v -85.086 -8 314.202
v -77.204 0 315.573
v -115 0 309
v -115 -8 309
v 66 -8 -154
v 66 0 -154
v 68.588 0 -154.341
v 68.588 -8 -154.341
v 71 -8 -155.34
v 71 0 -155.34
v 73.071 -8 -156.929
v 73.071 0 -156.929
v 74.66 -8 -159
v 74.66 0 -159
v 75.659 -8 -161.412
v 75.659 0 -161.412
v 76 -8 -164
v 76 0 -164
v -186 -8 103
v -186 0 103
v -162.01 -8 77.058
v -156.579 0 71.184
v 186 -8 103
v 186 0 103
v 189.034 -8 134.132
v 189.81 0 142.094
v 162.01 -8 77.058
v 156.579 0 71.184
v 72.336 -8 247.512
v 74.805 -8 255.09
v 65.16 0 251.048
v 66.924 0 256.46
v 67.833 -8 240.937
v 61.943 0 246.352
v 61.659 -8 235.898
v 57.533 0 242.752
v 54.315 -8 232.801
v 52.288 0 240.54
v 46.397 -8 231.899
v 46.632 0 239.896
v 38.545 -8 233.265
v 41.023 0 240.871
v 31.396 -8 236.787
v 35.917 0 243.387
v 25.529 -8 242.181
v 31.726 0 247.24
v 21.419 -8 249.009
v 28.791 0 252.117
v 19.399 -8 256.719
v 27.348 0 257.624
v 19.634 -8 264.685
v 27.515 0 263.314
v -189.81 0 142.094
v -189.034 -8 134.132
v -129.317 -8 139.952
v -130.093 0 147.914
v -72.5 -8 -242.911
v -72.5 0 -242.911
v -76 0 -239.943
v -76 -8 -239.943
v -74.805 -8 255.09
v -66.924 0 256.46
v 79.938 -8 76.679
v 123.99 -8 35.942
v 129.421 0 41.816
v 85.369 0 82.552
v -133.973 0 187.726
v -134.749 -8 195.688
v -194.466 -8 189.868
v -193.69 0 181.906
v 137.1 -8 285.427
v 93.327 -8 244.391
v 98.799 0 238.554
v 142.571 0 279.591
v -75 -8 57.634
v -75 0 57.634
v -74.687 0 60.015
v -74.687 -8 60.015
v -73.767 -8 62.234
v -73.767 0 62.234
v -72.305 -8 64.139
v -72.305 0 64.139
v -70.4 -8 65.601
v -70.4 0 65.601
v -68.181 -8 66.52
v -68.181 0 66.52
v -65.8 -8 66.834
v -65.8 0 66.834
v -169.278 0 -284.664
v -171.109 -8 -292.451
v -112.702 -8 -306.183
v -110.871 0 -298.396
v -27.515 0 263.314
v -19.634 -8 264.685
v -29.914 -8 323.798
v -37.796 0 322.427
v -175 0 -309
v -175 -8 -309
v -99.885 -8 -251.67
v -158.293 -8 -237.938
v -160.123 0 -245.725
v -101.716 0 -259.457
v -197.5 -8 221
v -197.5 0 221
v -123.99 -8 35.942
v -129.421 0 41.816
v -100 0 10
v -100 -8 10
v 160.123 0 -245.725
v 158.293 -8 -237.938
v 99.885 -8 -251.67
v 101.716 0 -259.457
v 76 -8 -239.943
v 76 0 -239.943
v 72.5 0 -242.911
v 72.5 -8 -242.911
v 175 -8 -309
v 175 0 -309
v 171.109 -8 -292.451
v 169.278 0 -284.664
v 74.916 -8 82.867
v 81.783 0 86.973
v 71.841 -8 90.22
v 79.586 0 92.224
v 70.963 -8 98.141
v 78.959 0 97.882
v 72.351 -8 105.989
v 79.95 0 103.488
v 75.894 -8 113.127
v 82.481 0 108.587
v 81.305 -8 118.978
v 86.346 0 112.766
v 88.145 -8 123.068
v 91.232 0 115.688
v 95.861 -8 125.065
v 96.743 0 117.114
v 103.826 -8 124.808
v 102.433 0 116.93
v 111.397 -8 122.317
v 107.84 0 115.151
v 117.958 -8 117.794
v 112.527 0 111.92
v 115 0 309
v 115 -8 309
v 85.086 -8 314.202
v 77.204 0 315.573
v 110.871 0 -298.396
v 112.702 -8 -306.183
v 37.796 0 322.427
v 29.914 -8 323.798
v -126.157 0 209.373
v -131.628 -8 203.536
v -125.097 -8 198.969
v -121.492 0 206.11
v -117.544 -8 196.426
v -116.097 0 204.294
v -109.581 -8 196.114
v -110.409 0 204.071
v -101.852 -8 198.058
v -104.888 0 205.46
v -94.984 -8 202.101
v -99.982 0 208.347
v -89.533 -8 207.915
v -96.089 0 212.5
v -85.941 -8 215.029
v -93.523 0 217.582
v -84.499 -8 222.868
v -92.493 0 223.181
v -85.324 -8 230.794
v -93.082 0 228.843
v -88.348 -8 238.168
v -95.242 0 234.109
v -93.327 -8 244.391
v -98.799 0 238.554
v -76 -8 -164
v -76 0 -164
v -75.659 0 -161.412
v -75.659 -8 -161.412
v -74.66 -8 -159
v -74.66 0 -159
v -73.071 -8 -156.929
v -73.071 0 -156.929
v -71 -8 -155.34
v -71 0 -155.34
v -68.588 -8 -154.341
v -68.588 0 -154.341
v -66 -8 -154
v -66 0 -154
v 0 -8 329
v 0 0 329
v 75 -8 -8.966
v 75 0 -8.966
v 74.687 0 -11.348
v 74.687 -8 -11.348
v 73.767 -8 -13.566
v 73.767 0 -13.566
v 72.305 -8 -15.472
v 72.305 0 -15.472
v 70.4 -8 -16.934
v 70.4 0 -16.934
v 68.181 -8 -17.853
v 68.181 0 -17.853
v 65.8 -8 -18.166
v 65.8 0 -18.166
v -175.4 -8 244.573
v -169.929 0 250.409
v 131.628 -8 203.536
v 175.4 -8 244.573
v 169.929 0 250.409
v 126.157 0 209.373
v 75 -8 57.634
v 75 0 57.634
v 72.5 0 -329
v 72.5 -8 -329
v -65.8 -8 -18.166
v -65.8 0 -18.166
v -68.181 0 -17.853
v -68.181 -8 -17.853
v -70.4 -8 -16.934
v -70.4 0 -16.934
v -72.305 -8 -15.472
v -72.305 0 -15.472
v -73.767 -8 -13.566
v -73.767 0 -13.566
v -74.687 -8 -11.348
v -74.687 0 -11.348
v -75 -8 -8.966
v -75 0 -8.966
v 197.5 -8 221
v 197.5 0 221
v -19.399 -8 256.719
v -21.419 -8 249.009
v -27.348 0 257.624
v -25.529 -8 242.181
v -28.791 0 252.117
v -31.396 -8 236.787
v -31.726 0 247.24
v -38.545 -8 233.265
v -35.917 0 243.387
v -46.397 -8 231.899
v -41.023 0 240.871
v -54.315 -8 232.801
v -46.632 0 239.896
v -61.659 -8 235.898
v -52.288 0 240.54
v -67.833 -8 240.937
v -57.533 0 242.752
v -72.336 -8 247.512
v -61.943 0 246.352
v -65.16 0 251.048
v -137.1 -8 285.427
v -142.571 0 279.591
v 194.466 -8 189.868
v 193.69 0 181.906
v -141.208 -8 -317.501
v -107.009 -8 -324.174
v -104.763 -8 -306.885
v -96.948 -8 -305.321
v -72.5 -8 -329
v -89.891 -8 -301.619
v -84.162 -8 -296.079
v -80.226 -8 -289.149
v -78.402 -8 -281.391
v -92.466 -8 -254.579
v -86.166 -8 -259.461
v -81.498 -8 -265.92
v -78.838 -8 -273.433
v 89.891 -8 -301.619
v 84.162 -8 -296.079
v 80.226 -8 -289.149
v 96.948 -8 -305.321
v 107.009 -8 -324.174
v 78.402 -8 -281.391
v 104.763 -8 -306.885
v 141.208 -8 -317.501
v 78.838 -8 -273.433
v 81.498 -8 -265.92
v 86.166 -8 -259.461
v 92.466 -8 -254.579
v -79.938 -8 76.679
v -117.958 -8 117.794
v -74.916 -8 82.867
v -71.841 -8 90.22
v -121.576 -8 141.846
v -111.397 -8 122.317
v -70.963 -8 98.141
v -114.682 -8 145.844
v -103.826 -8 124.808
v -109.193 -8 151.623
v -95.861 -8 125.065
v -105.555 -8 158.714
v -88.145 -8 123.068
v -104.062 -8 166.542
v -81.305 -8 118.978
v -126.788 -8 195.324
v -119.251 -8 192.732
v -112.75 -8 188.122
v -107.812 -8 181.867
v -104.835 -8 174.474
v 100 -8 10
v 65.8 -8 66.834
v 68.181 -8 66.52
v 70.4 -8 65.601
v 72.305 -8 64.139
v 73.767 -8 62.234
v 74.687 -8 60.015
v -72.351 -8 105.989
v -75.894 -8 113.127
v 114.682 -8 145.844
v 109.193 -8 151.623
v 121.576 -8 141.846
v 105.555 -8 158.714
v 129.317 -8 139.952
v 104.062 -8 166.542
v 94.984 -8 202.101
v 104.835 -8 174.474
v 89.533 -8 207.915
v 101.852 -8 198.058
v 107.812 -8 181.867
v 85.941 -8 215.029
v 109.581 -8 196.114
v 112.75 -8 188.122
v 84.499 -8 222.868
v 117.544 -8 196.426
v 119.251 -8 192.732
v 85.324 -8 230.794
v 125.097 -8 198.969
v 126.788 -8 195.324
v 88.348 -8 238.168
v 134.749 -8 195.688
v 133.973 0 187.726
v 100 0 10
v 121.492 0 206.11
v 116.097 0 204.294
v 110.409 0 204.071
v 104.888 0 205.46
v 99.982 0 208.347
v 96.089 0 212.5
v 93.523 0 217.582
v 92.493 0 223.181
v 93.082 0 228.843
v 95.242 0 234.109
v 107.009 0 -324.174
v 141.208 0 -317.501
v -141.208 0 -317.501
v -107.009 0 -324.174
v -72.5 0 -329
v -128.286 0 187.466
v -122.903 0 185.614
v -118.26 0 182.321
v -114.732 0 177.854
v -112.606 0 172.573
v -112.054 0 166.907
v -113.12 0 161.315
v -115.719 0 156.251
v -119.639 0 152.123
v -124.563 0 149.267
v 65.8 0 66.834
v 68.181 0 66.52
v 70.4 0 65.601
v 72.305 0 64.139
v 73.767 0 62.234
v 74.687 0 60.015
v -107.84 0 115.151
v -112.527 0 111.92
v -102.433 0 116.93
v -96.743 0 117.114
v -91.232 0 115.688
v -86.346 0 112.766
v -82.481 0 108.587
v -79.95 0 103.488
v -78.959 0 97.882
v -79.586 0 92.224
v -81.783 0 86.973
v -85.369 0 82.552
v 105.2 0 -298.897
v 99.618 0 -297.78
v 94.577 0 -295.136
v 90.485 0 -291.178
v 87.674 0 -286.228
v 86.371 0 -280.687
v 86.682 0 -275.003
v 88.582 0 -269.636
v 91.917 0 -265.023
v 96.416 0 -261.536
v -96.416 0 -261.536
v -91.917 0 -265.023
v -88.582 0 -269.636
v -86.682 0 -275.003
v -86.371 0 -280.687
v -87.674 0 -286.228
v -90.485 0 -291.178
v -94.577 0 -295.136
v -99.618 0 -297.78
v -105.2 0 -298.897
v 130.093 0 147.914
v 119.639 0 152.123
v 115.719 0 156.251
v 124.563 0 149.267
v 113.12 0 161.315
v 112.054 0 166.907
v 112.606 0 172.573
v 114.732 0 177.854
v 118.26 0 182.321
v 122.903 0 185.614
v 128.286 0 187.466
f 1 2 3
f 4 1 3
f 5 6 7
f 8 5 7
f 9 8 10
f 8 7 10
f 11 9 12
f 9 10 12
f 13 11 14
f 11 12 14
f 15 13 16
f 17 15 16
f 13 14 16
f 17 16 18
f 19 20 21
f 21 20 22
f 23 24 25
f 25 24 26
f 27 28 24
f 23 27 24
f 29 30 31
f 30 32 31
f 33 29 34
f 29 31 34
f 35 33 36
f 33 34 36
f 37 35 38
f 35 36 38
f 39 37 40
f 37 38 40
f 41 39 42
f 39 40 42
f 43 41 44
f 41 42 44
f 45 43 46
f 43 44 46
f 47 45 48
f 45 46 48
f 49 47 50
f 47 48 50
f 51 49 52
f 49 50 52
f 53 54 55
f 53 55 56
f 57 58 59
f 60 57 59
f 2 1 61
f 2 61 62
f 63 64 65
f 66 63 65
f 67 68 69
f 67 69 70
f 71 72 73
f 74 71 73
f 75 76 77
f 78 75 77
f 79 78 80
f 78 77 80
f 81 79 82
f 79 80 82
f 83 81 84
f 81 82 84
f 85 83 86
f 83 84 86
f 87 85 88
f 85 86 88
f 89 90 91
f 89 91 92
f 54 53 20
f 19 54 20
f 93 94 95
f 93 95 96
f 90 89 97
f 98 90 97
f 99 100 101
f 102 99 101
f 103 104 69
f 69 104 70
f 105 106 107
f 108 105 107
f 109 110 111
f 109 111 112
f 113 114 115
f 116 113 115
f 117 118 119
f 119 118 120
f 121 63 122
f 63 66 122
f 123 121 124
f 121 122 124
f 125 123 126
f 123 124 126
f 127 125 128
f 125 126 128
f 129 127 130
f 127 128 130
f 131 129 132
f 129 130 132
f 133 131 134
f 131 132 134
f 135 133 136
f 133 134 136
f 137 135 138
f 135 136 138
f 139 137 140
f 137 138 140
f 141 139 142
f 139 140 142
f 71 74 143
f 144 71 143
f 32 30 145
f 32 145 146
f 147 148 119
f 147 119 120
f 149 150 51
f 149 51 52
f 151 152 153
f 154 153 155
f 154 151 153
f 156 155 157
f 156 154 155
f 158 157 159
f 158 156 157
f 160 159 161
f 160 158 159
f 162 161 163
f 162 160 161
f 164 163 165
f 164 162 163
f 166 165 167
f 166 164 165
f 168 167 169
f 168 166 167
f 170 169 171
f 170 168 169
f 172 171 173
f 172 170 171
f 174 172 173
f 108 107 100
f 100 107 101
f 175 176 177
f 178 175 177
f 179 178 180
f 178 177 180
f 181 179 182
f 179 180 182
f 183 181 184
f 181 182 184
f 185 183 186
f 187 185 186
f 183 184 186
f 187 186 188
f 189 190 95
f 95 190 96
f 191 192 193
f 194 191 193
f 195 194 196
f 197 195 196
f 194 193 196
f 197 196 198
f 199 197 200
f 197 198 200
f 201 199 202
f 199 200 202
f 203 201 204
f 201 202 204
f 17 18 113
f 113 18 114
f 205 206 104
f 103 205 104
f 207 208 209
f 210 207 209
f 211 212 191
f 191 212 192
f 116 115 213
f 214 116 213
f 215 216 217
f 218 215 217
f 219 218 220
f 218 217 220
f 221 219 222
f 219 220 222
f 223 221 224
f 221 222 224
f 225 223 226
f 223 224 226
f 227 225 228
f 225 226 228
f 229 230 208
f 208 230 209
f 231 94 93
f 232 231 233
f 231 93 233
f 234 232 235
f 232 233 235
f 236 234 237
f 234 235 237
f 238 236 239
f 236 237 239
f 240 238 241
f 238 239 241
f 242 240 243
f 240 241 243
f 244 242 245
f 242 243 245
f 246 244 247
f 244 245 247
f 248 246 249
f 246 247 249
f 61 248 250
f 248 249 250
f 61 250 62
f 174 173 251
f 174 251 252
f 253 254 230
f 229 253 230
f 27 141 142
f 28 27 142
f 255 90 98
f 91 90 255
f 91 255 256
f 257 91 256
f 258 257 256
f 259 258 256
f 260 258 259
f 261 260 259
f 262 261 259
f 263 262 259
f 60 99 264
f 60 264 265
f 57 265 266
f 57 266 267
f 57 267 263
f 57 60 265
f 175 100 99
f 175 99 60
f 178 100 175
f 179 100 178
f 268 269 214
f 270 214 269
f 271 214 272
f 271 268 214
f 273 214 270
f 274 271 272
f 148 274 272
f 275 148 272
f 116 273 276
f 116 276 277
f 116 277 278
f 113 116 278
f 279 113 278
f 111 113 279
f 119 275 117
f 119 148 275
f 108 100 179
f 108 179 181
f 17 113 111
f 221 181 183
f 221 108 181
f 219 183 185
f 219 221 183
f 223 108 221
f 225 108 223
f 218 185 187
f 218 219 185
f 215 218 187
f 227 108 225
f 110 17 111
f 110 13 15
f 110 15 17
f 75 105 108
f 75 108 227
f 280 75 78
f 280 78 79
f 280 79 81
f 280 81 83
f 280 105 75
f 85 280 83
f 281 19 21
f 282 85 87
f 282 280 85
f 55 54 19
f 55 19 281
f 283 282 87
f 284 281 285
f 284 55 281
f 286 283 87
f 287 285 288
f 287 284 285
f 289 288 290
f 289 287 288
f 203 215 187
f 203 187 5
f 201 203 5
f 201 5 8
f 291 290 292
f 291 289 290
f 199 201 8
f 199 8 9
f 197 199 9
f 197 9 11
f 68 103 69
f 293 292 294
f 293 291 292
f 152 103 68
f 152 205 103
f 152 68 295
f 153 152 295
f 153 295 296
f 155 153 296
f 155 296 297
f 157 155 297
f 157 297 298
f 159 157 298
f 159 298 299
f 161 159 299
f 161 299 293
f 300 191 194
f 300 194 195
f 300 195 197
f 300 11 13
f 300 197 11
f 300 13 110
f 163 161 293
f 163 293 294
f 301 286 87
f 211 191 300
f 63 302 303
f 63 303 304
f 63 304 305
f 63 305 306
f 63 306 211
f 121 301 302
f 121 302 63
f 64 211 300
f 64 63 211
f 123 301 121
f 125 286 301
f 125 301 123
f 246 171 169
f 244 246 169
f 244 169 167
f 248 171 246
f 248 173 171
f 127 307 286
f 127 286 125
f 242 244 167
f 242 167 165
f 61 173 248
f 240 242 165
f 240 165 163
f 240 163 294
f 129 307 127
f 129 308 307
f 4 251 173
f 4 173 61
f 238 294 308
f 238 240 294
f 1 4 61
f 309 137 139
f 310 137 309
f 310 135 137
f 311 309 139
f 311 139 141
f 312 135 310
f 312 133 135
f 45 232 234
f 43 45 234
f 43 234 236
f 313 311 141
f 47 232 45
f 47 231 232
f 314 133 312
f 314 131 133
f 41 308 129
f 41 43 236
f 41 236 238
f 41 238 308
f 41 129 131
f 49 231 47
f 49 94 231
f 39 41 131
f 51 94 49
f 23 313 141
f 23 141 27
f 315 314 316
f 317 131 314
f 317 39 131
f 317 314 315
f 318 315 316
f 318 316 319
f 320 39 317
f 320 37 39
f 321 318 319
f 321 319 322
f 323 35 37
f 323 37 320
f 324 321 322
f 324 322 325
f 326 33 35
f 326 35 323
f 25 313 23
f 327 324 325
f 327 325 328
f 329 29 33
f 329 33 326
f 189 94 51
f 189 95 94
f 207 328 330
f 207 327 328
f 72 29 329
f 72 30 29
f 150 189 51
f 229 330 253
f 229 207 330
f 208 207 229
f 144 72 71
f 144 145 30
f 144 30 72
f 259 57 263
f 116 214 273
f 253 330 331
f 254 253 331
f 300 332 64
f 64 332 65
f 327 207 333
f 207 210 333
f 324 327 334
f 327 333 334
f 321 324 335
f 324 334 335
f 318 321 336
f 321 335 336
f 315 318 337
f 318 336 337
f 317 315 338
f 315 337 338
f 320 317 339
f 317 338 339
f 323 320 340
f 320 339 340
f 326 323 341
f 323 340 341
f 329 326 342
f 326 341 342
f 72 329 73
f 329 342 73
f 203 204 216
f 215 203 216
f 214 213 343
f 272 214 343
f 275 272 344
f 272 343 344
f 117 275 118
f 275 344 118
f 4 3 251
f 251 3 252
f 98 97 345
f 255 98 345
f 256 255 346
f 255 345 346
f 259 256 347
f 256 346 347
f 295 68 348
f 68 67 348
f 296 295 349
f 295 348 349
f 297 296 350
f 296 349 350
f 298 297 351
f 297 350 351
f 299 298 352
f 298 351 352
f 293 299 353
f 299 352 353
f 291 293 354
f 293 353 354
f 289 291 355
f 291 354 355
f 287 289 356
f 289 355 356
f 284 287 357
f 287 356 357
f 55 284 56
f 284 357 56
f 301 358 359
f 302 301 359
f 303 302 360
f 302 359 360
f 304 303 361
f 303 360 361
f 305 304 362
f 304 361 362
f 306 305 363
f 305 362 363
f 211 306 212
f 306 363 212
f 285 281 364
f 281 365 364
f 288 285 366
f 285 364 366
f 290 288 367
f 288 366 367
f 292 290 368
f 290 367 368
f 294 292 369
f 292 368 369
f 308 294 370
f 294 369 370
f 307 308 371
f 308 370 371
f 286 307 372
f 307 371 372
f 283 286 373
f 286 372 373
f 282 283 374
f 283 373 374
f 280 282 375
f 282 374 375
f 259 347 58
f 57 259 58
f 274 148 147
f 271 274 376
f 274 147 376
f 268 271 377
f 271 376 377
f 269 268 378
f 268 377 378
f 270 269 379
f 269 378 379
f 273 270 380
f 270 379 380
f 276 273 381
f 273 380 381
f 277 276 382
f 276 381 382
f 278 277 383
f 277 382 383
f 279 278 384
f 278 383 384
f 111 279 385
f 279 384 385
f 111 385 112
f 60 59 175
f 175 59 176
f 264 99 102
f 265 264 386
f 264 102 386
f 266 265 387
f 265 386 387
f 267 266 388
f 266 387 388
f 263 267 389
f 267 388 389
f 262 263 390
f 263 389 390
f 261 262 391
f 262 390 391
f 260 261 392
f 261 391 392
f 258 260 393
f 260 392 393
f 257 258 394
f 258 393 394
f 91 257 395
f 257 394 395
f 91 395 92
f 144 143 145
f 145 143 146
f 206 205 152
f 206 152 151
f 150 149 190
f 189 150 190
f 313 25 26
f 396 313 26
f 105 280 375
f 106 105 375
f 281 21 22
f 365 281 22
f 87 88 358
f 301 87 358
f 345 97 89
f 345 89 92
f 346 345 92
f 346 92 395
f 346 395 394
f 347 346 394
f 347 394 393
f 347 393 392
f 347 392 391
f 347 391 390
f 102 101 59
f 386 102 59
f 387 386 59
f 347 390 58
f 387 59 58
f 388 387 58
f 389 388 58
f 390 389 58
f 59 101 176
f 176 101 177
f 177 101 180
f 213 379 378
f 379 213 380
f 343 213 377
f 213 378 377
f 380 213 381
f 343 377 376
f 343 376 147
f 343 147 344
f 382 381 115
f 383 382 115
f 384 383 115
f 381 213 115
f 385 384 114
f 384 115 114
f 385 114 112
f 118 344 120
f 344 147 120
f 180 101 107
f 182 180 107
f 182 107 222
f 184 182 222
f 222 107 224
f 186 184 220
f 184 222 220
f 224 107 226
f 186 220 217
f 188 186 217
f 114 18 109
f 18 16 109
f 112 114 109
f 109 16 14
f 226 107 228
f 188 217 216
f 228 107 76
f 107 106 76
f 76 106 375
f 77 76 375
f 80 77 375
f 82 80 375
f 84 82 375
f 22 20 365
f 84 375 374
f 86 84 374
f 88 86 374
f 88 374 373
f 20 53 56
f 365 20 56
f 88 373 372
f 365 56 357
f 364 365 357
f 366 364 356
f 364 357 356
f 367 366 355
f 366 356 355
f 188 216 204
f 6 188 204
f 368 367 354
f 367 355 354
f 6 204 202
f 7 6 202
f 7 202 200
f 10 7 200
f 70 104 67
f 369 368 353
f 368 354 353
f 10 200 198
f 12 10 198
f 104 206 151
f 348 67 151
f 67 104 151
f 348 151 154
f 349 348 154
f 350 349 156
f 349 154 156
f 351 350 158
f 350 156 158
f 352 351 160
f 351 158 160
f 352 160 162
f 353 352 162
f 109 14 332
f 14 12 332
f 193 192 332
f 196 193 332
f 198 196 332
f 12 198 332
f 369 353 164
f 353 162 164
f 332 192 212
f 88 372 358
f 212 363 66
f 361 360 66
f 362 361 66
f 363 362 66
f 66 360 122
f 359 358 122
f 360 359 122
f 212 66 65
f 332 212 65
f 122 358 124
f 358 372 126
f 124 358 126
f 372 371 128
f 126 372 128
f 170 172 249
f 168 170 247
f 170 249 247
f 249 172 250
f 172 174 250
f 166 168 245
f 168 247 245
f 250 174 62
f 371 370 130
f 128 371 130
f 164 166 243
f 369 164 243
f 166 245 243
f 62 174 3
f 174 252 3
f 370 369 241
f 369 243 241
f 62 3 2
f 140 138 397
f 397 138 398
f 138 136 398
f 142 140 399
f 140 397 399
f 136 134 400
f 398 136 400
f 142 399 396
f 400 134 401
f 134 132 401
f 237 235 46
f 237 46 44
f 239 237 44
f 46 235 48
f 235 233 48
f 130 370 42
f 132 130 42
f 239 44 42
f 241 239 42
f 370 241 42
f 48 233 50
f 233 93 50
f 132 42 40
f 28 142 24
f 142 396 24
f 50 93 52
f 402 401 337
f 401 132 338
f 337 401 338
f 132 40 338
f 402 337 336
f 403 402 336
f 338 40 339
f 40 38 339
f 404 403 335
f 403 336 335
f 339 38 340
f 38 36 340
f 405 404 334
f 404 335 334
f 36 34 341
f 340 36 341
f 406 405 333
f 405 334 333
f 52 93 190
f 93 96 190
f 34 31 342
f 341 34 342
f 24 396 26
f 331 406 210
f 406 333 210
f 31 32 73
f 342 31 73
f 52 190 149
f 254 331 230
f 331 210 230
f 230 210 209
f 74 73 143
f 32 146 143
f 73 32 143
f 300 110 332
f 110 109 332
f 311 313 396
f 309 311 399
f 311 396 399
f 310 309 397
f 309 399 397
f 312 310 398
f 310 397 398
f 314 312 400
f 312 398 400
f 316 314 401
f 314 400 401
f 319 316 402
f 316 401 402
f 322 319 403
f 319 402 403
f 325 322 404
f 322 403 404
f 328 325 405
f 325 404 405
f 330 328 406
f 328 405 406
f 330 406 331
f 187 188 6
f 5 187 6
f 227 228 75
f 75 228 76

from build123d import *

# Parameters (mm, degrees)
F1_DEPTH = 8


# Not quite as in the source:
# - ends of sketch curves that miss each other by under 0.0002 mm in the source are joined


with BuildPart() as f1:
    # F0 (on Front) → F1 (new body)
    with BuildSketch(Plane.XZ):
        with BuildLine():
            Line((76, -164), (76, -239.943211))
            Line((76, -239.943211), (72.5, -242.910554))
            Line((72.5, -242.910554), (72.5, -329))
            ThreePointArc((72.5, -329), (124.1533829832, -321.067337789), (175.0000000351, -309.0000001251))
            Line((175.0000000351, -309.0000001251), (169.278269, -284.66357))
            Line((169.278269, -284.66357), (110.870838, -298.395725))
            ThreePointArc((110.870838, -298.395725), (86.8243094388, -283.5039655144), (101.716068848, -259.4574373536))
            Line((101.716068848, -259.4574373536), (160.123499, -245.725283))
            Line((160.123499, -245.725283), (100, 10))
            Line((100, 10), (129.421287, 41.816044))
            Line((129.421287, 41.816044), (85.369419, 82.552181))
            ThreePointArc((85.369419, 82.552181), (84.2641744646, 110.8148490327), (112.5268427835, 111.9200937658))
            Line((112.5268427835, 111.9200937658), (156.578712, 71.183957))
            Line((156.578712, 71.183957), (186, 103))
            Line((186, 103), (189.810038, 142.094309))
            Line((189.810038, 142.094309), (130.092964, 147.914193))
            ThreePointArc((130.092964, 147.914193), (112.1272346173, 169.7598464886), (133.9728870415, 187.7255764263))
            Line((133.9728870415, 187.7255764263), (193.689961, 181.905692))
            Line((193.689961, 181.905692), (197.5, 221))
            Line((197.5, 221), (169.928822, 250.409256))
            Line((169.928822, 250.409256), (126.15659, 209.372789))
            ThreePointArc((126.15659, 209.372789), (97.8870239172, 210.2847104224), (98.7989451563, 238.5542768333))
            Line((98.7989451563, 238.5542768333), (142.571177, 279.590745))
            Line((142.571177, 279.590745), (115, 309))
            Line((115, 309), (77.204235, 315.573177))
            Line((77.204235, 315.573177), (66.923764, 256.460472))
            ThreePointArc((66.923764, 256.460472), (43.7927054839, 240.1830599073), (27.5152939917, 263.3141190014))
            Line((27.5152939917, 263.3141190014), (37.795765, 322.426824))
            Line((37.795765, 322.426824), (0, 329))
            Line((0, 329), (-37.795765, 322.426824))
            Line((-37.795765, 322.426824), (-27.515295, 263.314119))
            ThreePointArc((-27.515295, 263.314119), (-43.7927064839, 240.1830599073), (-66.9237651771, 256.4604719692))
            Line((-66.9237651771, 256.4604719692), (-77.204235, 315.573177))
            Line((-77.204235, 315.573177), (-115, 309))
            Line((-115, 309), (-142.571178, 279.590745))
            Line((-142.571178, 279.590745), (-98.798945, 238.554277))
            ThreePointArc((-98.798945, 238.554277), (-97.8870241667, 210.2847101563), (-126.1565908437, 209.3727891667))
            Line((-126.1565908437, 209.3727891667), (-169.928823, 250.409256))
            Line((-169.928823, 250.409256), (-197.5, 221))
            Line((-197.5, 221), (-193.689962, 181.905692))
            Line((-193.689962, 181.905692), (-133.972888, 187.725576))
            ThreePointArc((-133.972888, 187.725576), (-112.1272346173, 169.7598464886), (-130.092965055, 147.9141935643))
            Line((-130.092965055, 147.9141935643), (-189.810039, 142.094309))
            Line((-189.810039, 142.094309), (-186, 103))
            Line((-186, 103), (-156.578713, 71.183957))
            Line((-156.578713, 71.183957), (-112.526844, 111.920094))
            ThreePointArc((-112.526844, 111.920094), (-84.2641747139, 110.8148493022), (-85.3694187181, 82.5521806951))
            Line((-85.3694187181, 82.5521806951), (-129.421288, 41.816044))
            Line((-129.421288, 41.816044), (-100, 10))
            Line((-100, 10), (-160.1235, -245.725283))
            Line((-160.1235, -245.725283), (-101.716069, -259.457438))
            ThreePointArc((-101.716069, -259.457438), (-86.8243105502, -283.5039659882), (-110.8708388768, -298.395724476))
            Line((-110.8708388768, -298.395724476), (-169.278269, -284.66357))
            Line((-169.278269, -284.66357), (-175, -309))
            ThreePointArc((-175, -309), (-124.1533829832, -321.067337789), (-72.5000000145, -329.0000001291))
            Line((-72.5000000145, -329.0000001291), (-72.5, -242.910554))
            Line((-72.5, -242.910554), (-76, -239.943211))
            Line((-76, -239.943211), (-76, -164))
            ThreePointArc((-76, -164), (-73.0710678119, -156.9289321881), (-66, -154))
            Line((-66, -154), (0, -154))
            Line((0, -154), (66, -154))
            ThreePointArc((66, -154), (73.0710678119, -156.9289321881), (76, -164))
        make_face()
        with BuildLine():
            Line((65.800007, -18.166468), (0, -18.166468))
            Line((0, -18.166468), (-65.800008, -18.166468))
            ThreePointArc((-65.800008, -18.166468), (-72.3053903869, -15.4718503869), (-75.000008, -8.966468))
            Line((-75.000008, -8.966468), (-75.000008, 57.633575))
            ThreePointArc((-75.000008, 57.633575), (-72.3053903869, 64.1389573869), (-65.800008, 66.833575))
            Line((-65.800008, 66.833575), (0, 66.833575))
            Line((0, 66.833575), (65.800007, 66.833575))
            ThreePointArc((65.800007, 66.833575), (72.3053893869, 64.1389573869), (75.000007, 57.633575))
            Line((75.000007, 57.633575), (75.000007, -8.966468))
            ThreePointArc((75.000007, -8.966468), (72.3053893869, -15.4718503869), (65.800007, -18.166468))
        make_face(mode=Mode.SUBTRACT)
    extrude(amount=F1_DEPTH)

    # F3: sweep along a path in F3_path
    with BuildLine(Plane(origin=(110.870838, -8, -298.395725), x_dir=(0, 0, 1), z_dir=(0, -1, 0))) as f3_path:
        Line((13.732155, -58.407431), (0, 0))
        ThreePointArc((0, 0), (14.8917592236, 24.0465284996), (38.9382876464, 9.154769152))
        Line((38.9382876464, 9.154769152), (52.670442, -49.252661))
    # F2 (on face) → F3 (sweep, cut)
    with BuildSketch(Plane(origin=(96.989833717, 0, 22.8032516792), x_dir=(0, 1, 0), z_dir=(0.973457176, 0, 0.2288692344))):
        Polygon((0, -315.8503827909), (-8, -315.8503827909), (-8, -323.8503827909), align=None)
    sweep(path=f3_path.line, mode=Mode.SUBTRACT)

    # F5: sweep along a path in F5_path
    with BuildLine(Plane(origin=(85.369419, -8, 82.552181), x_dir=(0, 0, 1), z_dir=(0, -1, 0))) as f5_path:
        Line((-40.736137, -44.051868), (0, 0))
        ThreePointArc((0, 0), (28.2626681852, 1.1052443944), (29.3679127658, -27.1574237835))
        Line((29.3679127658, -27.1574237835), (-11.368224, -71.209293))
    # F4 (on face) → F5 (sweep, cut)
    with BuildSketch(Plane(origin=(48.9199144477, 0, -45.2377688119), x_dir=(0, 1, 0), z_dir=(0.7341978267, 0, -0.6789356017))):
        Polygon((0, 118.5699679847), (-8, 118.5699679847), (-8, 110.5699679847), align=None)
    sweep(path=f5_path.line, mode=Mode.SUBTRACT)

    # F7: sweep along a path in F7_path
    with BuildLine(Plane(origin=(130.092964, -8, 147.914193), x_dir=(0, 0, 1), z_dir=(0, -1, 0))) as f7_path:
        Line((-5.819884, -59.717074), (0, 0))
        ThreePointArc((0, 0), (21.8456531581, 17.9657294149), (39.8113834263, -3.8799230415))
        Line((39.8113834263, -3.8799230415), (33.991499, -63.596997))
    # F6 (on face) → F7 (sweep, cut)
    with BuildSketch(Plane(origin=(174.3063070687, 0, -16.9874764527), x_dir=(0, 1, 0), z_dir=(0.9952845708, 0, -0.0969980576))):
        Polygon((0, 159.8354783382), (-8, 159.8354783382), (-8, 151.8354783382), align=None)
    sweep(path=f7_path.line, mode=Mode.SUBTRACT)

    # F9: sweep along a path in F9_path
    with BuildLine(Plane(origin=(126.15659, -8, 209.372789), x_dir=(0, 0, 1), z_dir=(0, -1, 0))) as f9_path:
        Line((41.036467, -43.772232), (0, 0))
        ThreePointArc((0, 0), (0.9119215885, 28.2695662386), (29.1814878333, 27.3576448437))
        Line((29.1814878333, 27.3576448437), (70.217956, -16.414587))
    # F8 (on face) → F9 (sweep, cut)
    with BuildSketch(Plane(origin=(215.3846137301, 0, 201.9230790338), x_dir=(0, 1, 0), z_dir=(0.729537198, 0, 0.6839411355))):
        Polygon((0, 66.4615554934), (-8, 66.4615554934), (-8, 58.4615554934), align=None)
    sweep(path=f9_path.line, mode=Mode.SUBTRACT)

    # F11: sweep along a path in F11_path
    with BuildLine(Plane(origin=(66.923764, -8, 256.460472), x_dir=(0, 0, 1), z_dir=(0, -1, 0))) as f11_path:
        Line((59.112705, -10.280471), (0, 0))
        ThreePointArc((0, 0), (-16.2774120773, 23.1310586047), (6.8536470014, 39.4084700083))
        Line((6.8536470014, 39.4084700083), (65.966352, 29.127999))
    # F10 (on face) → F11 (sweep, cut)
    with BuildSketch(Plane(origin=(55.5376187282, 0, 319.3412844519), x_dir=(0.9852117527, 0, -0.1713411869), z_dir=(0.1713411869, 0, 0.9852117527))):
        Polygon((21.9918369956, 0), (21.9918369956, -8), (29.9918369956, -8), align=None)
    sweep(path=f11_path.line, mode=Mode.SUBTRACT)

    # F13: sweep along a path in F13_path
    with BuildLine(Plane(origin=(-27.515295, -8, 263.314119), x_dir=(0, 0, 1), z_dir=(0, -1, 0))) as f13_path:
        Line((59.112705, 10.28047), (0, 0))
        ThreePointArc((0, 0), (-23.1310590934, 16.277411488), (-6.8536470308, 39.4084701771))
        Line((-6.8536470308, 39.4084701771), (52.259058, 49.68894))
    # F12 (on face) → F13 (sweep, cut)
    with BuildSketch(Plane(origin=(-55.5376105295, 0, 319.341285892), x_dir=(0.9852117571, 0, 0.1713411616), z_dir=(-0.1713411616, 0, 0.9852117571))):
        Polygon((18.008154492, 0), (18.008154492, -8), (26.008154492, -8), align=None)
    sweep(path=f13_path.line, mode=Mode.SUBTRACT)

    # F15: sweep along a path in F15_path
    with BuildLine(Plane(origin=(-126.1565908437, -8, 209.3727891667), x_dir=(0, 0, -1), z_dir=(0, 1, 0))) as f15_path:
        Line((-41.0364668333, 43.7722321563), (0, 0))
        ThreePointArc((0, 0), (-0.9119210729, -28.2695667552), (-29.1814878333, -27.3576458437))
        Line((-29.1814878333, -27.3576458437), (-70.2179558333, 16.4145871563))
    # F14 (on face) → F15 (sweep, cut)
    with BuildSketch(Plane(origin=(-215.3846129172, 0, 201.9230851377), x_dir=(0, -1, 0), z_dir=(-0.7295371863, 0, 0.6839411479))):
        Polygon((0, 106.461550303), (8, 106.461550303), (8, 114.461550303), align=None)
    sweep(path=f15_path.line, mode=Mode.SUBTRACT)

    # F17: sweep along a path in F17_path
    with BuildLine(Plane(origin=(-133.972888, -8, 187.725576), x_dir=(0, 0, 1), z_dir=(0, -1, 0))) as f17_path:
        Line((-5.819884, 59.717074), (0, 0))
        ThreePointArc((0, 0), (-17.9657296763, -21.8456533988), (-39.8113824357, -3.879922945))
        Line((-39.8113824357, -3.879922945), (-45.631267, 55.837151))
    # F16 (on face) → F17 (sweep, cut)
    with BuildSketch(Plane(origin=(-174.3063082, 0, -16.9874769975), x_dir=(0, -1, 0), z_dir=(-0.9952845705, 0, -0.09699806))):
        Polygon((0, 199.8354791034), (8, 199.8354791034), (8, 207.8354791034), align=None)
    sweep(path=f17_path.line, mode=Mode.SUBTRACT)

    # F19: sweep along a path in F19_path
    with BuildLine(Plane(origin=(-112.526844, -8, 111.920094), x_dir=(0, 0, 1), z_dir=(0, -1, 0))) as f19_path:
        Line((-40.736137, 44.051869), (0, 0))
        ThreePointArc((0, 0), (-1.1052443315, -28.2626689474), (-29.3679133049, -27.1574252819))
        Line((-29.3679133049, -27.1574252819), (-70.10405, 16.894444))
    # F18 (on face) → F19 (sweep, cut)
    with BuildSketch(Plane(origin=(-48.9199129921, 0, -45.2377688877), x_dir=(0, -1, 0), z_dir=(-0.7341978161, 0, -0.6789356132))):
        Polygon((0, 158.5699702901), (8, 158.5699702901), (8, 166.5699702901), align=None)
    sweep(path=f19_path.line, mode=Mode.SUBTRACT)

    # F21: sweep along a path in F21_path
    with BuildLine(Plane(origin=(-101.716069, -8, -259.457438), x_dir=(0, 0, 1), z_dir=(0, -1, 0))) as f21_path:
        Line((13.732155, 58.407431), (0, 0))
        ThreePointArc((0, 0), (-24.0465282, -14.8917584), (-38.938286476, 9.1547698768))
        Line((-38.938286476, 9.1547698768), (-25.206132, 67.5622))
    # F20 (on face) → F21 (sweep, cut)
    with BuildSketch(Plane(origin=(-96.9898309629, 0, 22.8032521208), x_dir=(0, -1, 0), z_dir=(-0.9734571736, 0, 0.2288692447))):
        Polygon((0, -275.8503839769), (8, -275.8503839769), (8, -267.8503839769), align=None)
    sweep(path=f21_path.line, mode=Mode.SUBTRACT)


solid = f1.part
